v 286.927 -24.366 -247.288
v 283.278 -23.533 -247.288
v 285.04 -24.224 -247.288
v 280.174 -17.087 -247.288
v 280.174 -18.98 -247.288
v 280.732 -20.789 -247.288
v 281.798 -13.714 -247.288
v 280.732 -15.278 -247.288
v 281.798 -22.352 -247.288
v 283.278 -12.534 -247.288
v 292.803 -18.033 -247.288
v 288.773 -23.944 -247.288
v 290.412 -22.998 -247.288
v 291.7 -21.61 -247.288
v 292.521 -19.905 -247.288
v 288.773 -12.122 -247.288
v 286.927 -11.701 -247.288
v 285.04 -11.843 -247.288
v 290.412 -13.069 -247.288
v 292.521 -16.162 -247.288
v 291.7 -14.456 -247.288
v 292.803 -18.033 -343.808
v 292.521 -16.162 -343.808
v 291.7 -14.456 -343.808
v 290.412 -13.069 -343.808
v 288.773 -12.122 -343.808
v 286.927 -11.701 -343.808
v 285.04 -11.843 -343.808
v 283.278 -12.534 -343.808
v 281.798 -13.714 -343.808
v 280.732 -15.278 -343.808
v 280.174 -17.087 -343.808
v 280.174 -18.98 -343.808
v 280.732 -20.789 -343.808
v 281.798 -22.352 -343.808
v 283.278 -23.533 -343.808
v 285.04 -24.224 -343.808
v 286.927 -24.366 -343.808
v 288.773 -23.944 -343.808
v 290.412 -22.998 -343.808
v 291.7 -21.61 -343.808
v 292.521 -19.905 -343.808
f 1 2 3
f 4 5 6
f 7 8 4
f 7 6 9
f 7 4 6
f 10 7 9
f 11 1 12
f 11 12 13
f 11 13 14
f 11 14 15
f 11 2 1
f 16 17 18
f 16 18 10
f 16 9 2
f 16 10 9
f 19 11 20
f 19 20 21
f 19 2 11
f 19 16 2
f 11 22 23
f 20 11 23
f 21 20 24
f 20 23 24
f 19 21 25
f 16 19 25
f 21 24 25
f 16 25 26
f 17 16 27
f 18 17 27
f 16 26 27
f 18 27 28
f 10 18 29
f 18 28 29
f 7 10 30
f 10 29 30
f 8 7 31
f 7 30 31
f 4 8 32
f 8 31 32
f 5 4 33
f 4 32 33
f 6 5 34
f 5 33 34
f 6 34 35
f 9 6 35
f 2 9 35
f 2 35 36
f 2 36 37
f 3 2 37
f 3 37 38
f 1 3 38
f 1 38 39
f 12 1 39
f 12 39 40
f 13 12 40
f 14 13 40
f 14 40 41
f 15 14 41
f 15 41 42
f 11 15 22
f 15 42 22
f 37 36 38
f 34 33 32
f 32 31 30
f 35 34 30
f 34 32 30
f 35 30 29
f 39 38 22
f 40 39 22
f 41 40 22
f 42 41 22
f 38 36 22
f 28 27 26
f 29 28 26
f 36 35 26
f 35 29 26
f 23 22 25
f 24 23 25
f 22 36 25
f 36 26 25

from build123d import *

# Parameters (mm, degrees)
BOSS_EXTRUDE1_OUTLINE_R = 6.35
BOSS_EXTRUDE1_DEPTH     = 96.52


# Read off the part's stored shape, not the designer's step: Boss-Extrude1
with BuildPart() as part:
    # Boss-Extrude1 outline → Boss-Extrude1 (new body)
    with BuildSketch(Plane.XY.offset(-343.808229346)):
        with Locations((286.452894146, -18.033383804)):
            Circle(BOSS_EXTRUDE1_OUTLINE_R)
    extrude(amount=BOSS_EXTRUDE1_DEPTH)


solid = part.part
